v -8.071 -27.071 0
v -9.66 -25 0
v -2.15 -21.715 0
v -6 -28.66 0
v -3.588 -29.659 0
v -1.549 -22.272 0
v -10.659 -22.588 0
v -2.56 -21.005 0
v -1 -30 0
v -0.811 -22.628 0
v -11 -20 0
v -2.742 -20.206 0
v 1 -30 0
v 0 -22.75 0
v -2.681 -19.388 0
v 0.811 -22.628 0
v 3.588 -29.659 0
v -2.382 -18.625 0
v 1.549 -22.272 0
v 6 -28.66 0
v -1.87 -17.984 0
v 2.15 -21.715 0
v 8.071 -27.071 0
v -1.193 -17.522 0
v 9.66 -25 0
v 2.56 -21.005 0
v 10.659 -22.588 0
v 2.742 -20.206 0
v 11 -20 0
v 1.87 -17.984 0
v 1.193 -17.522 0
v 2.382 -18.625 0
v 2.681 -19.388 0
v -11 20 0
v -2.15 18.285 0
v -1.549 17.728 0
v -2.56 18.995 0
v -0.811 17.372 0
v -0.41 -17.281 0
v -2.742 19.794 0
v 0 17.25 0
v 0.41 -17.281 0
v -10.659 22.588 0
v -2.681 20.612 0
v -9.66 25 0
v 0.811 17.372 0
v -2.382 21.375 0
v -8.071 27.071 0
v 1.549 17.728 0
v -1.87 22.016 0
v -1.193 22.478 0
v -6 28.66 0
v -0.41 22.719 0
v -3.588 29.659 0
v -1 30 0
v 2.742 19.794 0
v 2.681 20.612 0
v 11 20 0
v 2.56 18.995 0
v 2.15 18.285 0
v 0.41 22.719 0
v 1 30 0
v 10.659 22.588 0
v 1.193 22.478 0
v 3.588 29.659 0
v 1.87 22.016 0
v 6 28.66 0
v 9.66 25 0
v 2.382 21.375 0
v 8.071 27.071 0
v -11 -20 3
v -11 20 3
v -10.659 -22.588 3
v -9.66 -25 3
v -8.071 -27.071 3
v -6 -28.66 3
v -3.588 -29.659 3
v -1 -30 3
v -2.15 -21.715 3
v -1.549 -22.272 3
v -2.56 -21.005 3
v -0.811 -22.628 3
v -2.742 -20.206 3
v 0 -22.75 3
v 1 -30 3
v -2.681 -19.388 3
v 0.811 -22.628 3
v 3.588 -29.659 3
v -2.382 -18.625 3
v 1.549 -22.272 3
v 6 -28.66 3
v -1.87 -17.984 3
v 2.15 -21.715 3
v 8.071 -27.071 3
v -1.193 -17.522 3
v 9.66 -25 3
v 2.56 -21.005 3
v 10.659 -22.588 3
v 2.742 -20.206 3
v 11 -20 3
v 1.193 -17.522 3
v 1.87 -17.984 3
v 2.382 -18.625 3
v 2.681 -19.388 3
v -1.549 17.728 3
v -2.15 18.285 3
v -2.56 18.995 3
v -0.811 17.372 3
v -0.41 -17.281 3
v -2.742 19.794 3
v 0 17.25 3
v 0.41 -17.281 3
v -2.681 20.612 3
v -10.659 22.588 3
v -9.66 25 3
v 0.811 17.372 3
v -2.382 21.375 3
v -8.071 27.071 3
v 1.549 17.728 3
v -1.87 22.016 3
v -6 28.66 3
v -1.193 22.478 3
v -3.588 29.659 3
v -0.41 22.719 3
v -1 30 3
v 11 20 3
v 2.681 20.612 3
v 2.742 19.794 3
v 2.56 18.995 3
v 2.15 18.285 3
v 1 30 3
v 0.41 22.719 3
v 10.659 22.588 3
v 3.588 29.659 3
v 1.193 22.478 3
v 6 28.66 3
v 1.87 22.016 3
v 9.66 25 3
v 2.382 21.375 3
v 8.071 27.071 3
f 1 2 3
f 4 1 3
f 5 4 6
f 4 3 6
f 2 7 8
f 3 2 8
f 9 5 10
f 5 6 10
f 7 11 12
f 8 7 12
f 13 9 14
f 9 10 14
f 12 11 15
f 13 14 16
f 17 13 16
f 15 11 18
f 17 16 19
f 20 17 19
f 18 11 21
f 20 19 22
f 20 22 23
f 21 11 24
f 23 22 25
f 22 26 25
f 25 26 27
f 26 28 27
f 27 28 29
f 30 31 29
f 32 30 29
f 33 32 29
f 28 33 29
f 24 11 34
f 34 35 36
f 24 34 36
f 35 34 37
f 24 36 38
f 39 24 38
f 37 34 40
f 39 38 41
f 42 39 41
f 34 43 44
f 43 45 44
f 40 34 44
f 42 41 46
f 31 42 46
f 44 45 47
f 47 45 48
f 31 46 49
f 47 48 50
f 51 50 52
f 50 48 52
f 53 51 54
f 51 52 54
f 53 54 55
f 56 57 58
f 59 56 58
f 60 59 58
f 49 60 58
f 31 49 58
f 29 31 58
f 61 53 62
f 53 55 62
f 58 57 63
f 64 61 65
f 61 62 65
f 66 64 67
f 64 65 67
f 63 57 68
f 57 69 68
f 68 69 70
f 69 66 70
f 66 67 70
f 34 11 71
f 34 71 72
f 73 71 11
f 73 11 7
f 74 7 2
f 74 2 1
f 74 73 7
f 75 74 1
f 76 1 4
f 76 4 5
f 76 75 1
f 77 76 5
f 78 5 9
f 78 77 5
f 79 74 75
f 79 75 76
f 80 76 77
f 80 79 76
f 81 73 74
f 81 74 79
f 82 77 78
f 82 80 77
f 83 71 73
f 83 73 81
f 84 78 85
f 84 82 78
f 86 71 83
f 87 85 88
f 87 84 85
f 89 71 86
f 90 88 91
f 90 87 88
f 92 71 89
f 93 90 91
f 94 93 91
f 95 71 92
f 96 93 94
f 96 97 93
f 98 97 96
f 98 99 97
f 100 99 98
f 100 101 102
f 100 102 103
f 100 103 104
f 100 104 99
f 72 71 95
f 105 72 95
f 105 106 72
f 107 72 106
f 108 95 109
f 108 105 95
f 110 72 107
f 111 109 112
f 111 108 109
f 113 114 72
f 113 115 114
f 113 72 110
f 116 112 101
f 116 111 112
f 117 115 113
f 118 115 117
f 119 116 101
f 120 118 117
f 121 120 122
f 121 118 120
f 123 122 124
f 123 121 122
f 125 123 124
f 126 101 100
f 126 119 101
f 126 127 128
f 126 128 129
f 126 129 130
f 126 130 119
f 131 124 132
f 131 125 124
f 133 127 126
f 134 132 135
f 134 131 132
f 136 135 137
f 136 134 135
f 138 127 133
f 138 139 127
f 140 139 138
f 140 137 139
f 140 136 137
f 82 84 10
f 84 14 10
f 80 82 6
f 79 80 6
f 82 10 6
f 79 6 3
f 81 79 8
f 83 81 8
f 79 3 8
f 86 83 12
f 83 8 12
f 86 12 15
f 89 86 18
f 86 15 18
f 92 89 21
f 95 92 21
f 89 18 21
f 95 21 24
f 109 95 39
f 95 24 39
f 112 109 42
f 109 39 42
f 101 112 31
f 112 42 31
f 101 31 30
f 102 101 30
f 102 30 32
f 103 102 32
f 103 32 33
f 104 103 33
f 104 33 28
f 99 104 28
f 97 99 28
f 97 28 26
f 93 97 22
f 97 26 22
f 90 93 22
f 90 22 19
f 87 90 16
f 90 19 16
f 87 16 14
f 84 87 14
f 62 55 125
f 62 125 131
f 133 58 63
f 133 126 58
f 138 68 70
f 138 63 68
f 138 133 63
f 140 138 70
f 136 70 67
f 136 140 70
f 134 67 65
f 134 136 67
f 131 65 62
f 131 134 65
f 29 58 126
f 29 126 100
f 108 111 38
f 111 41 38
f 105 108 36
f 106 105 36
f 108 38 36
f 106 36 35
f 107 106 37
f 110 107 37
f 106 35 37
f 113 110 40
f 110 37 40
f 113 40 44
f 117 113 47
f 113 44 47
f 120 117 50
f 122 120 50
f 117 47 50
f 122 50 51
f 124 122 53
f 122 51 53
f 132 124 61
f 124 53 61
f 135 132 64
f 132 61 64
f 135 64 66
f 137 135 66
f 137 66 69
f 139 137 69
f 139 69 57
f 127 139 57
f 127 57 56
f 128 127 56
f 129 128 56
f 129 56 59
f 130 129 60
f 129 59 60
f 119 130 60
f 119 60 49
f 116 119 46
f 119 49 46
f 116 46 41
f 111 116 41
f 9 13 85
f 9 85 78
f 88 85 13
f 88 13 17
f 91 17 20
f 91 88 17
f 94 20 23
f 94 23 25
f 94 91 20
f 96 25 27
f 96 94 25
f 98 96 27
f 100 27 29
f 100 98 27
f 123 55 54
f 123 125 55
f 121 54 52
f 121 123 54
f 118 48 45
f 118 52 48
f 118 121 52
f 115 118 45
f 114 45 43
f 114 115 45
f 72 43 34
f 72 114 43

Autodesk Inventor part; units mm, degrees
ref_plane "YZ Plane" through (0, 0, 0) normal (1, 0, 0) x (0, 1, 0)
ref_plane "XZ Plane" through (0, 0, 0) normal (0, 1, 0) x (-1, 0, 0)
ref_plane "XY Plane" through (0, 0, 0) normal (0, 0, 1) x (1, 0, 0)
sketch "Skizze1" plane through (0, 0, 0) normal (0, 0, 1) x (1, 0, 0)
  line L0 (-15.4, 0) -> (15.4, 0) projected
  line L1 (0, -42) -> (0, 42) projected
  line L2 (11, -30) -> (-11, -30)
  line L3 (-11, -30) -> (-11, 30)
  line L4 (-11, 30) -> (11, 30)
  line L5 (11, 30) -> (11, -30)
  line L6 (11, -30) -> (-11, 30) construction
  line L7 (-11, -30) -> (11, 30) construction
  point P0 (0, 0)
  dimension "d0" = 60
  dimension "d1" = 22
extrude "Extrusion1" add sketch "Skizze1" along normal blind 3
sketch "Skizze2" plane through (0, 0, 3) normal (0, 0, 1) x (1, 0, 0)
  line L0 (11, 30) -> (-11, 30) projected
  line L1 (-11, 30) -> (-11, -30) projected
  line L2 (-11, -30) -> (11, -30) projected
  line L3 (11, -30) -> (11, 30) projected
  line L4 (-17.5, 0) -> (17.5, 0) projected
  line L5 (0, -42) -> (0, 42) projected
  line L6 (3.1579, -20) -> (-3.1579, -20)
  line L7 (-3.1579, -20) -> (-3.1579, 20)
  line L8 (-3.1579, 20) -> (3.1579, 20)
  line L9 (3.1579, 20) -> (3.1579, -20)
  line L10 (3.1579, -20) -> (-3.1579, 20) construction
  line L11 (-3.1579, -20) -> (3.1579, 20) construction
  point P0 (0, 0)
  point P1 (0, 20)
  point P2 (0, -20)
  dimension "d4" = 40
hole "Bohrung1" at (0, 20, 3) at (0, -20, 3) direction (0, 0, -1) diameter 5.5 end through all
fillet "Rundung1" radius 10 4 edges at (-11, 30, 1.5) (11, 30, 1.5) (11, -30, 1.5) (-11, -30, 1.5)
sketch "Skizze3" plane through (0, 0, 3) normal (0, 0, 1) x (1, 0, 0)
  point P0 (0, 0)
properties part number "24_0497_0012" material "PMMA-Kunststoff"
